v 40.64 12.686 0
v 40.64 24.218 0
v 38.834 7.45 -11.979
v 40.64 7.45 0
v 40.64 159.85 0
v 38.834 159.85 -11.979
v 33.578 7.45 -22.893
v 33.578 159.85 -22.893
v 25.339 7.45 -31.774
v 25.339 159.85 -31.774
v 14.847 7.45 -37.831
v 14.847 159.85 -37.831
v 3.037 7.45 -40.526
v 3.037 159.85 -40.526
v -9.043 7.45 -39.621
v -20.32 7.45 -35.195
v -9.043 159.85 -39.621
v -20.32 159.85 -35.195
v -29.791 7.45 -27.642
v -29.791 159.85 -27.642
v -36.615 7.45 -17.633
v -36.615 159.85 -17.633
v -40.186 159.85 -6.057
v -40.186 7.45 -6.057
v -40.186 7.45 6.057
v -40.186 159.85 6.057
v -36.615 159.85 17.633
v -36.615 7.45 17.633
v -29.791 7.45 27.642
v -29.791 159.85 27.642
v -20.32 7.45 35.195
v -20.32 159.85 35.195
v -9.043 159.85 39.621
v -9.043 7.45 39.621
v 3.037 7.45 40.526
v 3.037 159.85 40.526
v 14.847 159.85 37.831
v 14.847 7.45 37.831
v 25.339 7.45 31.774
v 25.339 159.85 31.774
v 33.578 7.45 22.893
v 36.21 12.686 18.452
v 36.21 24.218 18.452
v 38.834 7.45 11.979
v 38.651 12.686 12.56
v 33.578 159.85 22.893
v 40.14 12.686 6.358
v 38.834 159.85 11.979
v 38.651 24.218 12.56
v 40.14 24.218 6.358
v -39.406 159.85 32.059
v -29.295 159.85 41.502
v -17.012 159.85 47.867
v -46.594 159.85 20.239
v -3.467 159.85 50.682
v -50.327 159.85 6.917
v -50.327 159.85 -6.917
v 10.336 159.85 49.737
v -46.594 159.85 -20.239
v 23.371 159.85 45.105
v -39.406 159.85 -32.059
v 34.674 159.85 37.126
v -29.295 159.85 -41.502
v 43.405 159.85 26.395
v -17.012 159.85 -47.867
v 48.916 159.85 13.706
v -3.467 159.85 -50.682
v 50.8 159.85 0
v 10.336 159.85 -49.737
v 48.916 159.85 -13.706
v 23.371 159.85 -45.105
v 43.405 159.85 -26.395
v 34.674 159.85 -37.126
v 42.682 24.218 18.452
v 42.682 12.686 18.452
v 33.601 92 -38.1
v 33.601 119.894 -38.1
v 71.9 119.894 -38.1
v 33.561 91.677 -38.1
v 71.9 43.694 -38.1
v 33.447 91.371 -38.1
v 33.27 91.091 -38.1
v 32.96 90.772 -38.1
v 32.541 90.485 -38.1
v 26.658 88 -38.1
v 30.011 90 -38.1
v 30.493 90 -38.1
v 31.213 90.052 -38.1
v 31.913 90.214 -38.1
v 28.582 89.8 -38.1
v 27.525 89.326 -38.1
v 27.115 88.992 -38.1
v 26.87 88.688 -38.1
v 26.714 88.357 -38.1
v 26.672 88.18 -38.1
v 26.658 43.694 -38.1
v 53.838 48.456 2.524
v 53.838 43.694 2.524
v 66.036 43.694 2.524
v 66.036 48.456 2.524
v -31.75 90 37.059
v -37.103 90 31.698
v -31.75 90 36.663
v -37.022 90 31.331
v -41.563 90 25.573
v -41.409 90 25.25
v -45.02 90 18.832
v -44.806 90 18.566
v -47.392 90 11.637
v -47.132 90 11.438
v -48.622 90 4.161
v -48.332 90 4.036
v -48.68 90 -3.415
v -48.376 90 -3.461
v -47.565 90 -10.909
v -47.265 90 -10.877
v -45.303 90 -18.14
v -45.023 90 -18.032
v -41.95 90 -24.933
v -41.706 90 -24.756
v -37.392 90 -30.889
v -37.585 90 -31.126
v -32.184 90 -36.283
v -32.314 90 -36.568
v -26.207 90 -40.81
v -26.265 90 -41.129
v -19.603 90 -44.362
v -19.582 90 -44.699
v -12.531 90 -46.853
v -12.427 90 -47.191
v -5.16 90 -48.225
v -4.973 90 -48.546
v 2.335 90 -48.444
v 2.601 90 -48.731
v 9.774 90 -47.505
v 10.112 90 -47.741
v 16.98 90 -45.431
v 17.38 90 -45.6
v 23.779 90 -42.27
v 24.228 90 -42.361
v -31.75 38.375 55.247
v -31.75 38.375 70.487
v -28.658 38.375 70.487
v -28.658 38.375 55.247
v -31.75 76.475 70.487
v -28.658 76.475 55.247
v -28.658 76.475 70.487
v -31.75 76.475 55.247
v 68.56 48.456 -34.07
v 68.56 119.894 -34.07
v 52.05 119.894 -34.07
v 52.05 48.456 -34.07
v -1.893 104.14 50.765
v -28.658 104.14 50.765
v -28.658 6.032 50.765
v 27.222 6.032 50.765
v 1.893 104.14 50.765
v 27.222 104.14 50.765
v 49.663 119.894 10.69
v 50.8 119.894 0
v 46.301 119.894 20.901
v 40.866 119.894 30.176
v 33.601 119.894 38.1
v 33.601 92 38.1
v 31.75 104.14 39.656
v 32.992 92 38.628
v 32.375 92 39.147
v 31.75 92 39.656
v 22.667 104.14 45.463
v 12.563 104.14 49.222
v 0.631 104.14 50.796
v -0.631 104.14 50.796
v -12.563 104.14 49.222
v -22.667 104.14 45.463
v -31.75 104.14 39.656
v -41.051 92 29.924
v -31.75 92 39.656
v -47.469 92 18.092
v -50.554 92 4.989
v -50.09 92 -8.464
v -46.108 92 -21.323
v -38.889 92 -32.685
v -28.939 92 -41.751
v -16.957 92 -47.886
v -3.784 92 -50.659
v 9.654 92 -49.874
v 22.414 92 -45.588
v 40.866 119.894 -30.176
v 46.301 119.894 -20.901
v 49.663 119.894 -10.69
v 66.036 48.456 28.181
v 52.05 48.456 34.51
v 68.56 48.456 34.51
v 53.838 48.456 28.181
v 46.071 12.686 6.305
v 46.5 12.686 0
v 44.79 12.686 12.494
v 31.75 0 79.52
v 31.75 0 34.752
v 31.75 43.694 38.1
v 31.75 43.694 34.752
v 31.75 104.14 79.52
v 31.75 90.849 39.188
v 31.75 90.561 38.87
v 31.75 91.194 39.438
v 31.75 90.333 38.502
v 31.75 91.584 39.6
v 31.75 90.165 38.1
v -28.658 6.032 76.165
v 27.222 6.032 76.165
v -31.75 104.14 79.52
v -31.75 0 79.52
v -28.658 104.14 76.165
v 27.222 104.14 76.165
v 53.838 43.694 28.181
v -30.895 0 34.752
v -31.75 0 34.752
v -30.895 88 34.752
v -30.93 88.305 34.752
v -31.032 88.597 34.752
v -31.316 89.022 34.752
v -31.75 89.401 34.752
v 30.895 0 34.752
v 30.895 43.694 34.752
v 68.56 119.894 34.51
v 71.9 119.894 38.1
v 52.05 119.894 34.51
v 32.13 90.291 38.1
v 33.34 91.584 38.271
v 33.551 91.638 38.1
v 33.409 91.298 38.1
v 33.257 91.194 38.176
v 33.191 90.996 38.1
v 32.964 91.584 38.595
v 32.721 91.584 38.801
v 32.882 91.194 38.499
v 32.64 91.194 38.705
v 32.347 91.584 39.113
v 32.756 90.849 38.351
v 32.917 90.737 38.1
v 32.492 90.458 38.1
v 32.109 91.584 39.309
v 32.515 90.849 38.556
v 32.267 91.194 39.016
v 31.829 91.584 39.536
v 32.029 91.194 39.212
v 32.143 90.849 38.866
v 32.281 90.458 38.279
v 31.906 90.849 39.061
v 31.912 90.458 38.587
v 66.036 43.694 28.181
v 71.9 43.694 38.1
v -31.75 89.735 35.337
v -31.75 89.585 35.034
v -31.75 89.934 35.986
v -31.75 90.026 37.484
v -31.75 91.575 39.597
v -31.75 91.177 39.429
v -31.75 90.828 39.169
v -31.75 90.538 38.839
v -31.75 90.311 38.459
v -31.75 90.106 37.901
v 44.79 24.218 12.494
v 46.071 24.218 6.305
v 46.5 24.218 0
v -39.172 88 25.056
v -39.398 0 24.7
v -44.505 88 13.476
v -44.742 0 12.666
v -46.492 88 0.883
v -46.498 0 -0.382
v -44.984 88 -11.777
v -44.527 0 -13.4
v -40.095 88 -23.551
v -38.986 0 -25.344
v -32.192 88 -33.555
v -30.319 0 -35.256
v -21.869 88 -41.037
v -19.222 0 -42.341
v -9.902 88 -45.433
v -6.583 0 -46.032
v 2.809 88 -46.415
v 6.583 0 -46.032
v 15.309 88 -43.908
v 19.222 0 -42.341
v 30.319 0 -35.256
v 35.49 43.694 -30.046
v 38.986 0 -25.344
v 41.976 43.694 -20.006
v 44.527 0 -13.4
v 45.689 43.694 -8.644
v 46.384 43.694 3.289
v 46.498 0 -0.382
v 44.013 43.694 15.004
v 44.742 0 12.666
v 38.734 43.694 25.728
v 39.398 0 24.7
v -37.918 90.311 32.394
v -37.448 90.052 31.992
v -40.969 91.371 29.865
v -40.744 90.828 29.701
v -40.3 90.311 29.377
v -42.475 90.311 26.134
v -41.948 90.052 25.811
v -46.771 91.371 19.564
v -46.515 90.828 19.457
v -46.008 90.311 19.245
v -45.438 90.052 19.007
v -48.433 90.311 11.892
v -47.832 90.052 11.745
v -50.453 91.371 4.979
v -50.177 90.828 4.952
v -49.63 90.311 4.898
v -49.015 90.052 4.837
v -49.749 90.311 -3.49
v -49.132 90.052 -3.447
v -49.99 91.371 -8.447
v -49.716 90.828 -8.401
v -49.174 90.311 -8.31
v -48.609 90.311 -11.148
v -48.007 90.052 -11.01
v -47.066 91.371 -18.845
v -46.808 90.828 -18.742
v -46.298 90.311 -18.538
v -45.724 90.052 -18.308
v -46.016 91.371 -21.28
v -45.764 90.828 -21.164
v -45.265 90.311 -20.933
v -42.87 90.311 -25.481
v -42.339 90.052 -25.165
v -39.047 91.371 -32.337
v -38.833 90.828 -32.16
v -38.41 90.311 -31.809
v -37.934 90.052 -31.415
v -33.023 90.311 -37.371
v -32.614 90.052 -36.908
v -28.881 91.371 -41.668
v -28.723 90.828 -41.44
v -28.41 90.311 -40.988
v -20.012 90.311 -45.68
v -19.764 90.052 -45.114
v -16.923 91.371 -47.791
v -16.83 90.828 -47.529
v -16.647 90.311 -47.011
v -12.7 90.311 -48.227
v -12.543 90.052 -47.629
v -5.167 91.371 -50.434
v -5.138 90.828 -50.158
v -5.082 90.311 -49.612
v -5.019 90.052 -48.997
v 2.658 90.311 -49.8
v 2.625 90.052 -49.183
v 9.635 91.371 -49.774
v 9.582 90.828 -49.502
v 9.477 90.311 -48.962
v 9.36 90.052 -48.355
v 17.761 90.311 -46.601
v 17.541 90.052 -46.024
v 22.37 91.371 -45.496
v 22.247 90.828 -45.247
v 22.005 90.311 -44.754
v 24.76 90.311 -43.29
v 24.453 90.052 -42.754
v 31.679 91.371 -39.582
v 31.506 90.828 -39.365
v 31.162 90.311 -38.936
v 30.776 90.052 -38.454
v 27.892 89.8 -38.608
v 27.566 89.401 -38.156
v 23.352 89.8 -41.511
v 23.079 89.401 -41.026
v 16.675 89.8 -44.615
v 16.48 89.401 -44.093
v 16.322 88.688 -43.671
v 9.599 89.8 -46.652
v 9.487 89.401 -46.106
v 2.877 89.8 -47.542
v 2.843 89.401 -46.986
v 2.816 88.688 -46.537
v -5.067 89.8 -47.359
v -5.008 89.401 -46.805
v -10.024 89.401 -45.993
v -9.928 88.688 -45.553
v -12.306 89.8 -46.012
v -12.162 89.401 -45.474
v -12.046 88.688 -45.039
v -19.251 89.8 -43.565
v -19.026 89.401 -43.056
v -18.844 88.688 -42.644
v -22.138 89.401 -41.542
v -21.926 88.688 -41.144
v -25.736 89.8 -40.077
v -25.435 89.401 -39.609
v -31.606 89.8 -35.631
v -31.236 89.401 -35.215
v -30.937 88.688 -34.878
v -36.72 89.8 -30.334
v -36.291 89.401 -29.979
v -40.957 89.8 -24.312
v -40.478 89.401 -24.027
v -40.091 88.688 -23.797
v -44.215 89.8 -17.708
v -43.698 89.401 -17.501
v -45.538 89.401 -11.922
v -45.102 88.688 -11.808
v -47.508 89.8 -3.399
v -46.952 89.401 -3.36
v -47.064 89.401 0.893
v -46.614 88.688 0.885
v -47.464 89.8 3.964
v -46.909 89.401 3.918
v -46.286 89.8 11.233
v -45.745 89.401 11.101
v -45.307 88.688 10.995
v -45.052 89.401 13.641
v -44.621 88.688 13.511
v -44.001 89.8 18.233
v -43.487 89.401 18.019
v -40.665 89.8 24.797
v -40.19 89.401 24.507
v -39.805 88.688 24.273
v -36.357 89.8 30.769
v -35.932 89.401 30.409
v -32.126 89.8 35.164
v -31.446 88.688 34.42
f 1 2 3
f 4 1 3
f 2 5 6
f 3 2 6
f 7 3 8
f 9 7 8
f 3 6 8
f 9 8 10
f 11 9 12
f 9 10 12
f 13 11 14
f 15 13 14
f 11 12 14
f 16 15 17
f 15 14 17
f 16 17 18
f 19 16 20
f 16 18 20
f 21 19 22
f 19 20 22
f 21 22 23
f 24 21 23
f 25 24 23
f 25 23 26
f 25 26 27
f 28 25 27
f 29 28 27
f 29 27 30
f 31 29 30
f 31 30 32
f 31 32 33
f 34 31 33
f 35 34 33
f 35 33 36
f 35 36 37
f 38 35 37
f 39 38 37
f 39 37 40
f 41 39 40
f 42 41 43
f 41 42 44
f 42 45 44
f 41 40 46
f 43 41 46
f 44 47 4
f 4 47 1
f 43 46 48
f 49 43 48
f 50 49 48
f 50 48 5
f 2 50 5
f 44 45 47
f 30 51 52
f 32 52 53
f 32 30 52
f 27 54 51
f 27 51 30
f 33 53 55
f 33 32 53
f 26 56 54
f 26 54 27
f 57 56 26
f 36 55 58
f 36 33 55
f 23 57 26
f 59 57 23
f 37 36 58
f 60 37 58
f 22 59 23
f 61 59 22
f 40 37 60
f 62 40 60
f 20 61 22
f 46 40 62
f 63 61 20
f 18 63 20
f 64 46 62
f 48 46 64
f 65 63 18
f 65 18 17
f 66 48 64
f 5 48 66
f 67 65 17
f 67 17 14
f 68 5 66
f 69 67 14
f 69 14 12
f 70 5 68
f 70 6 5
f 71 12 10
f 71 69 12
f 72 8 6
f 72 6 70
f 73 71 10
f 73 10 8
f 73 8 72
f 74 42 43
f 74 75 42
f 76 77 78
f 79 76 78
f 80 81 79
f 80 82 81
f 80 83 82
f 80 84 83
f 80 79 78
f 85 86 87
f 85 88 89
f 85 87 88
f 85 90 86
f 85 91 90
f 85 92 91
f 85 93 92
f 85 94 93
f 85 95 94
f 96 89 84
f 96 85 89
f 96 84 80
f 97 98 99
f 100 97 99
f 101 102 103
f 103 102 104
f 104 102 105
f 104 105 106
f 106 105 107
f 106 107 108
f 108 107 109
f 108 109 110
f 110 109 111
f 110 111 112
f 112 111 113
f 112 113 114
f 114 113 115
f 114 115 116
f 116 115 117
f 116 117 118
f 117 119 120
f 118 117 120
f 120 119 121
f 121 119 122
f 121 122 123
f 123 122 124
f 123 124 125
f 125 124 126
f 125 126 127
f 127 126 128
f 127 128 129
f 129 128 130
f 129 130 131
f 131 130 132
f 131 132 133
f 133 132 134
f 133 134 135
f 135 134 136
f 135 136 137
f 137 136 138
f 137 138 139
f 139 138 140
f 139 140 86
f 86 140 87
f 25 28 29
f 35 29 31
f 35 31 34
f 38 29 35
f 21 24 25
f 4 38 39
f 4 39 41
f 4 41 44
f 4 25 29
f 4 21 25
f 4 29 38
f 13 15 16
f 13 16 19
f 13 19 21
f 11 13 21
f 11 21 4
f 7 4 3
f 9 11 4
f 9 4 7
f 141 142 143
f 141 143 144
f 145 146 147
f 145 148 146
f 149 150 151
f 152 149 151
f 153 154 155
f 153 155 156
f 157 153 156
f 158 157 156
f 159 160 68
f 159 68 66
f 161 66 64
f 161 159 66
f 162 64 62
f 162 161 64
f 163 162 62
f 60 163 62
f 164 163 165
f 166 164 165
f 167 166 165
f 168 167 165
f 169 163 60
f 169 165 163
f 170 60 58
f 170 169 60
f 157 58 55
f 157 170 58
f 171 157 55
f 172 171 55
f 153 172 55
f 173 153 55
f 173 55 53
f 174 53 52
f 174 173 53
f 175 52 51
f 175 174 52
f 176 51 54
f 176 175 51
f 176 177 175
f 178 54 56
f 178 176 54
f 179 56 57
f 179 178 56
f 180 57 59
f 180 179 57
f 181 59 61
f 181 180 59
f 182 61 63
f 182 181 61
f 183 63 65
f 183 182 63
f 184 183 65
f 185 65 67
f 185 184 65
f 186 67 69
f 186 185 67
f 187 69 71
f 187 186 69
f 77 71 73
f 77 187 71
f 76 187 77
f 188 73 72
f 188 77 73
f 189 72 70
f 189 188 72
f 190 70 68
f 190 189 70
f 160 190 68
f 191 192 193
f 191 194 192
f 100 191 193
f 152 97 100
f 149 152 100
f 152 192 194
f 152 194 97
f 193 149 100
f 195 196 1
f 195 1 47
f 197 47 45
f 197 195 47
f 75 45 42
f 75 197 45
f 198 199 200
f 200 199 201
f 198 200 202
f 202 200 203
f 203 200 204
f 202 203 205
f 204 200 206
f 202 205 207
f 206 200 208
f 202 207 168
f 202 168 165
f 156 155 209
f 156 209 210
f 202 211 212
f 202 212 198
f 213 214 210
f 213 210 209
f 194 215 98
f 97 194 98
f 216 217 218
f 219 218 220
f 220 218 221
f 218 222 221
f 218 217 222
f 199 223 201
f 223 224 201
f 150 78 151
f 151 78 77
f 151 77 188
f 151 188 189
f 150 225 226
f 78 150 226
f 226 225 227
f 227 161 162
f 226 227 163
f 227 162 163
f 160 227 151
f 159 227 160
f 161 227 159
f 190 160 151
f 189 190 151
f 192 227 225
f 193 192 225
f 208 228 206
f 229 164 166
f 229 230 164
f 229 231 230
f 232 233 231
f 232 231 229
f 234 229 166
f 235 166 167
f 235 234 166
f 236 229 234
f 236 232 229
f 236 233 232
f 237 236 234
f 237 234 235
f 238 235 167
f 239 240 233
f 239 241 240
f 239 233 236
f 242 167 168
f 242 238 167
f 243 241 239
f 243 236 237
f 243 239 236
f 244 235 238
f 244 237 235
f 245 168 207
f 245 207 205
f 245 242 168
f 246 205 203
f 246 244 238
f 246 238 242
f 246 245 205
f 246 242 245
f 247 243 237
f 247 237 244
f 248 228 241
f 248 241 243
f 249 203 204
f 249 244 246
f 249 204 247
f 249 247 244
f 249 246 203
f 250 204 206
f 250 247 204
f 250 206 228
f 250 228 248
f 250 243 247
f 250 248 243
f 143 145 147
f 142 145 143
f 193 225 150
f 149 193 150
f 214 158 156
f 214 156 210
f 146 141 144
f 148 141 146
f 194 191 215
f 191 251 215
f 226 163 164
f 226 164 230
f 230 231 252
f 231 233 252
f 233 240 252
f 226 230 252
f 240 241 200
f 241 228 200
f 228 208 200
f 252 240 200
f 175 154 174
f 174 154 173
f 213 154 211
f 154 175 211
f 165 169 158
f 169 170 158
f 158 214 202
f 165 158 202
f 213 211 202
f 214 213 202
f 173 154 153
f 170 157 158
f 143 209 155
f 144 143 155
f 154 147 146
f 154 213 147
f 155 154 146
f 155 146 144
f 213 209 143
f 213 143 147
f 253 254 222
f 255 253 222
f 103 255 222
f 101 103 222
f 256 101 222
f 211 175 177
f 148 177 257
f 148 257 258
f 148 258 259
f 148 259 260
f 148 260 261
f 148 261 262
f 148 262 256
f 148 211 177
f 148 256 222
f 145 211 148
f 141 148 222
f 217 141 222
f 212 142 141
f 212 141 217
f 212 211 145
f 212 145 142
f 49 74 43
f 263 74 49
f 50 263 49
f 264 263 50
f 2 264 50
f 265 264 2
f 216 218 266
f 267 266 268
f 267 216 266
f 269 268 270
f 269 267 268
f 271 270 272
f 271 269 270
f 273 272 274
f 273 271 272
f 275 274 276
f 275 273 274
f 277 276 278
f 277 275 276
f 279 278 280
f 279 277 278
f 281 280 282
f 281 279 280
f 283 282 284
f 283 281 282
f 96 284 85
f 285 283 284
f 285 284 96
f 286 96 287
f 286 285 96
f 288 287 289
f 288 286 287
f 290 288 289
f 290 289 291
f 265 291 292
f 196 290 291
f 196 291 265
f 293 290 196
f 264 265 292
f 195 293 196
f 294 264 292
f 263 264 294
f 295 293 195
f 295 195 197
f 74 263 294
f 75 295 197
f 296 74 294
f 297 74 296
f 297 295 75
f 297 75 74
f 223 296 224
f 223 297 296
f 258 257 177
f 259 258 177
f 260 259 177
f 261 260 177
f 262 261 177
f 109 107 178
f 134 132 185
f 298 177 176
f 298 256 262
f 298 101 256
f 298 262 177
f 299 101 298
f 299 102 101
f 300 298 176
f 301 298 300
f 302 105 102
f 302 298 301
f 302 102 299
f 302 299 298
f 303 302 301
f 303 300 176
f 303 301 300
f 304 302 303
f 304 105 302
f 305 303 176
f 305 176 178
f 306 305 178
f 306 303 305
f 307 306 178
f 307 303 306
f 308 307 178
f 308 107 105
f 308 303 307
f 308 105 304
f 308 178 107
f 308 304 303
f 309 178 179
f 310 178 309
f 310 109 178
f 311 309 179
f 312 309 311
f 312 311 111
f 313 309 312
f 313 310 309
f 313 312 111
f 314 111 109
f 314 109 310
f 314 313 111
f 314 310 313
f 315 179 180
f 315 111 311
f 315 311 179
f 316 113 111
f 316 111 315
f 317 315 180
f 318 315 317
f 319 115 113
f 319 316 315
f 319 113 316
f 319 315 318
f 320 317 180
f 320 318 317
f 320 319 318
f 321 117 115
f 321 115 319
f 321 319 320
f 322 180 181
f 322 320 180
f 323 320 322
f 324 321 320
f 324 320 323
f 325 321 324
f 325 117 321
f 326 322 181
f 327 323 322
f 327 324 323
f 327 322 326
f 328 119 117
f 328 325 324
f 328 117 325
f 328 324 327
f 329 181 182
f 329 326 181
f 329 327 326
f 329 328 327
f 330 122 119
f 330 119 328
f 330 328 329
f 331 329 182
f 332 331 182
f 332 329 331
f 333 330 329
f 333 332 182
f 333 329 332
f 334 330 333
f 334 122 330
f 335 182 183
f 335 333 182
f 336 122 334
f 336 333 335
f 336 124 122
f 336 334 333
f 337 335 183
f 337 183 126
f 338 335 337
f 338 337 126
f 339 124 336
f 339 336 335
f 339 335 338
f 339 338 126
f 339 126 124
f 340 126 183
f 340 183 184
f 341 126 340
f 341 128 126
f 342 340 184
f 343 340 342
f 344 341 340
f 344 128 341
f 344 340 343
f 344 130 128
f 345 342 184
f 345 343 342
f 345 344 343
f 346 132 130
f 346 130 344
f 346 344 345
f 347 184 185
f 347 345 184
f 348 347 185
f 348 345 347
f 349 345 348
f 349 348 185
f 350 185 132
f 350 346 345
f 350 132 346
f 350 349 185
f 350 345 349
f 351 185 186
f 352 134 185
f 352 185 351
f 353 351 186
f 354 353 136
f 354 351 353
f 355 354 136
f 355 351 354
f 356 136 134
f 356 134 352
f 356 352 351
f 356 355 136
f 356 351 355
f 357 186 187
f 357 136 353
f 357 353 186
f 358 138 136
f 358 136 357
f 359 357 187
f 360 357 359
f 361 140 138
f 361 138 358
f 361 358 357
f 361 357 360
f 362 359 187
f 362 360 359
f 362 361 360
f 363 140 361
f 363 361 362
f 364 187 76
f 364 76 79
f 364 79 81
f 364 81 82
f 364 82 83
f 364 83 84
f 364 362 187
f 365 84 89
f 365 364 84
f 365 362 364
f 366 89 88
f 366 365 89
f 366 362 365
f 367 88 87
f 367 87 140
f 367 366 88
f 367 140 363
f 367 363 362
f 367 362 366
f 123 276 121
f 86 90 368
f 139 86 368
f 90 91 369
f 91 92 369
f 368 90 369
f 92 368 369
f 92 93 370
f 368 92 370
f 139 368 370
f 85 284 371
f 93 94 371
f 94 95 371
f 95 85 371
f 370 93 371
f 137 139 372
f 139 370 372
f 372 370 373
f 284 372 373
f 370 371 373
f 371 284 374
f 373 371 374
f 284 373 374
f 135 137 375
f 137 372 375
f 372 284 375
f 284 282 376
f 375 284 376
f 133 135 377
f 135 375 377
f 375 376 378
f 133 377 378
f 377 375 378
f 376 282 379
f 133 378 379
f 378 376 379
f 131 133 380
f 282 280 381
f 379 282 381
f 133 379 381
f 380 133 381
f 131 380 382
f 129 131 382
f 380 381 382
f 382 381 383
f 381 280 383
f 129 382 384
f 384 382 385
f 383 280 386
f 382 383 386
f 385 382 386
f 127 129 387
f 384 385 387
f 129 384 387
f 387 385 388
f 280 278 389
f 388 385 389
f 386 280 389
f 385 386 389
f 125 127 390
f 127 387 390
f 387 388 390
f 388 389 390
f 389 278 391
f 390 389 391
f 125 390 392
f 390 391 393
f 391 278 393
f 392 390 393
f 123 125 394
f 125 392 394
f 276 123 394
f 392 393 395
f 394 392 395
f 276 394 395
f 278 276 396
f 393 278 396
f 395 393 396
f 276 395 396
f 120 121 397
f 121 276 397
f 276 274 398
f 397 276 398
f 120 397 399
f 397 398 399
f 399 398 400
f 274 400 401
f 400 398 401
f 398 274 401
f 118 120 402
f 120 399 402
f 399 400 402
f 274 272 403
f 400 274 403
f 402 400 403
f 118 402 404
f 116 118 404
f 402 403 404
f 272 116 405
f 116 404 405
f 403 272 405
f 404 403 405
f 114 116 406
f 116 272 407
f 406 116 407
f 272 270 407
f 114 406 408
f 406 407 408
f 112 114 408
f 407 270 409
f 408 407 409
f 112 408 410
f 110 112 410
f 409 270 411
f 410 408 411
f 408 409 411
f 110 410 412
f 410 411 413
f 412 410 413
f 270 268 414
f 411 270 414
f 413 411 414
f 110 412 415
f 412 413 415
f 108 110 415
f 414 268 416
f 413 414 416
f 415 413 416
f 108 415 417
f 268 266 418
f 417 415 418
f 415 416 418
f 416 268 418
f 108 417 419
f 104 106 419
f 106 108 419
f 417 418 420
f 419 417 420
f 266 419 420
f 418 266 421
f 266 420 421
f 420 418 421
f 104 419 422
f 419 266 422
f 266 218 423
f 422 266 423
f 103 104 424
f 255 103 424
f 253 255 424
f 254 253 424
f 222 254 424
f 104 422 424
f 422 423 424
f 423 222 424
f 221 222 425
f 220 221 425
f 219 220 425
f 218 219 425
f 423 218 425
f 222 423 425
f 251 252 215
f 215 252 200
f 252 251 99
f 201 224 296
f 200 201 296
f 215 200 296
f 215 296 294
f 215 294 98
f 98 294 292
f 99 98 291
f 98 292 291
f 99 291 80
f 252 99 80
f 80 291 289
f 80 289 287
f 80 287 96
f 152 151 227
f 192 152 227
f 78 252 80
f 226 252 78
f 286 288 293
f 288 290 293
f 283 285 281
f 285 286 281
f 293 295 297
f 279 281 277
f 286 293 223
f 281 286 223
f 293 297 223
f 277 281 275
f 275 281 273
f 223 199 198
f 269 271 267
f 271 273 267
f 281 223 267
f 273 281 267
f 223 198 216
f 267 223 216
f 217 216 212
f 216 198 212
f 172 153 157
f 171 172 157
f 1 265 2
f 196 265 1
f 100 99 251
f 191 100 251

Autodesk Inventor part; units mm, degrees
sketch "Sketch1" plane through (0, 0, 0) normal (0, 1, 0) x (-1, 0, 0)
  circle A0 centre (0, 0) radius 46.5
  dimension "d0" = 93
extrude "Extrusion1" add sketch "Sketch1" along normal blind 90
sketch "Sketch2" plane through (0, 90, 0) normal (0, 1, 0) x (1, 0, 0)
  circle A0 centre (0, 0) radius 50.8
  dimension "d3" = 101.6
extrude "Extrusion2" add sketch "Sketch2" along normal blind 146.05
sketch "Sketch4" plane through (0, 90, 0) normal (0, -1, 0) x (1, 0, 0)
  point P0 (0, 0)
sketch "Sketch5" plane through (0, 90, 0) normal (0, -1, 0) x (1, 0, 0)
  point P0 (0, 0)
sketch "Sketch6" plane through (0, 90, 0) normal (0, -1, 0) x (1, 0, 0)
  point P0 (0, 0)
fillet "Fillet1" radius 2 2 edges at (-50.8, 90, 0) (46.5, 90, 0)
ref_plane "Work Plane2" through (46.5, 0, 0) normal (1, 0, 0) x (0, 1, 0)
sketch "Sketch7" plane through (46.5, 0, 0) normal (1, 0, 0) x (0, 1, 0)
  line L0 (24.2179, 0) -> (12.6856, 0)
  line L1 (12.6856, 0) -> (12.6856, 18.4517)
  line L2 (12.6856, 18.4517) -> (24.2179, 18.4517)
  line L3 (24.2179, 18.4517) -> (24.2179, 0)
  point P0 (0, 0)
extrude "Extrusion4" cut sketch "Sketch7" against normal blind 17.4625
sketch "Sketch12" plane through (0, 90, 0) normal (0, -1, 0) x (1, 0, 0)
  point P0 (0, 0)
sketch "Sketch13" plane through (0, 90, 0) normal (0, -1, 0) x (1, 0, 0)
  point P0 (0, 0)
sketch "Sketch14" plane through (0, 90, 0) normal (0, -1, 0) x (1, 0, 0)
  line L0 (65.7696, 29.9336) -> (57.3376, 29.9336)
  line L1 (57.3376, 29.9336) -> (57.3376, 7.1672)
  line L2 (57.3376, 7.1672) -> (65.7696, 7.1672)
  line L3 (65.7696, 7.1672) -> (65.7696, 29.9336)
  point P0 (0, 0)
extrude "Extrusion8" cut sketch "Sketch14" against normal blind 141.605
ref_plane "Work Plane4" through (0, 0, 46.5) normal (0, 0, 1) x (1, 0, 0)
sketch "Sketch24" plane through (0, 0, 46.5) normal (0, 0, 1) x (1, 0, 0)
  point P0 (0, 0)
sketch "Sketch25" plane through (0, 0, 46.5) normal (0, 0, 1) x (1, 0, 0)
  line L0 (0, 0) -> (-31.75, 0)
  line L1 (-31.75, 0) -> (-31.75, 104.14)
  line L2 (-31.75, 104.14) -> (0, 104.14)
  line L3 (0, 104.14) -> (0, 0)
  line L4 (0, 0) -> (31.75, 0)
  line L5 (31.75, 0) -> (31.75, 104.14)
  line L6 (31.75, 104.14) -> (0, 104.14)
  line L7 (0, 104.14) -> (0, 0)
  dimension "d59" = 31.75
  dimension "d60" = 104.14
  dimension "d61" = 31.75
  dimension "d62" = 104.14
extrude "Extrusion13" add sketch "Sketch25" along normal blind 33.02
sketch "Sketch26" plane through (0, 0, 79.52) normal (0, 0, 1) x (1, 0, 0)
  line L0 (-31.75, 104.14) -> (-31.75, 0) projected
  line L1 (0, 0) -> (31.75, 0) projected
  line L2 (-31.75, 104.14) -> (31.75, 104.14)
  line L3 (31.75, 104.14) -> (31.75, 0)
  line L4 (31.75, 0) -> (-31.75, 0)
  line L5 (-31.75, 0) -> (-31.75, 104.14)
extrude "Extrusion14" add sketch "Sketch26" against normal blind 44.7675
sketch "Sketch27" plane through (0, 104.14, 0) normal (0, 1, 0) x (1, 0, 0)
  point P0 (0, 0)
sketch "Sketch28" plane through (0, 104.14, 0) normal (0, 1, 0) x (1, 0, 0)
  point P0 (0, 0)
sketch "Sketch29" plane through (0, 104.14, 0) normal (0, 1, 0) x (1, 0, 0)
  line L0 (-28.6575, -50.7647) -> (27.2225, -50.7647)
  line L1 (27.2225, -50.7647) -> (27.2225, -76.1647)
  line L2 (27.2225, -76.1647) -> (-28.6575, -76.1647)
  line L3 (-28.6575, -76.1647) -> (-28.6575, -50.7647)
  point P0 (0, 0)
  dimension "d67" = 55.88
  dimension "d68" = 25.4
extrude "Extrusion15" cut sketch "Sketch29" against normal blind 98.1075
sketch "Sketch30" plane through (-31.75, 0, 79.52) normal (-1, 0, 0) x (0, 0, 1)
  line L0 (-0.5043, 102.352) -> (0, 76.957)
  line L1 (0, 0) -> (0, 104.14) projected
  line L2 (-24.2726, 76.475) -> (-9.0326, 76.475)
  line L3 (-9.0326, 76.475) -> (-9.0326, 38.375)
  line L4 (-9.0326, 38.375) -> (-24.2726, 38.375)
  line L5 (-24.2726, 38.375) -> (-24.2726, 76.475)
  point P0 (-79.52, 0)
  dimension "d71" = 25.4
  dimension "d72" = 15.24
  dimension "d73" = 38.1
extrude "Extrusion16" cut sketch "Sketch30" against normal blind 46.355
ref_plane "Work Plane5" through (46.5, 0, 0) normal (1, 0, 0) x (0, 1, 0)
sketch "Sketch31" plane through (46.5, 0, 0) normal (1, 0, 0) x (0, 1, 0)
  line L0 (11.9436, 0) -> (43.6936, 0)
  line L1 (43.6936, 0) -> (119.8936, 0)
  line L2 (119.8936, 0) -> (119.8936, 38.1)
  line L3 (119.8936, 38.1) -> (43.6936, 38.1)
  line L4 (43.6936, 38.1) -> (43.6936, 0)
  line L5 (43.6936, 0) -> (119.8936, 0)
  line L6 (119.8936, 0) -> (119.8936, -38.1)
  line L7 (119.8936, -38.1) -> (43.6936, -38.1)
  line L8 (43.6936, -38.1) -> (43.6936, 0)
  point P0 (0, 0)
  dimension "d76" = 31.75
  dimension "d77" = 76.2
  dimension "d78" = 38.1
  dimension "d79" = 76.2
  dimension "d80" = 38.1
extrude "Extrusion17" add sketch "Sketch31" along normal blind 25.4
sketch "Sketch32" plane through (71.9, 0, 0) normal (1, 0, 0) x (0, 0, -1)
  point P0 (0, 0)
sketch "Sketch33" plane through (71.9, 0, 0) normal (1, 0, 0) x (0, 0, -1)
  line L0 (-20.4546, 119.8936) -> (-38.1, 119.8936) projected
  line L1 (0, 43.6936) -> (38.1, 43.6936) projected
  line L2 (-38.1, 119.8936) -> (38.1, 119.8936)
  line L3 (38.1, 119.8936) -> (38.1, 43.6936)
  line L4 (38.1, 43.6936) -> (-38.1, 43.6936)
  line L5 (-38.1, 43.6936) -> (-38.1, 119.8936)
  point P0 (0, 0)
extrude "Extrusion18" add sketch "Sketch33" against normal blind 47.625
sketch "Sketch3" plane through (0, 236.05, 0) normal (0, 1, 0) x (1, 0, 0)
  circle A0 centre (0, 0) radius 40.64
  dimension "d6" = 81.28
extrude "Extrusion3" cut sketch "Sketch3" against normal blind 228.6
sketch "Sketch34" plane through (33.601, 119.8936, 38.1) normal (0, 1, 0) x (1, 0, 0)
  line L0 (34.9589, 72.1697) -> (18.4489, 72.1697)
  line L1 (18.4489, 72.1697) -> (18.4489, 3.5897)
  line L2 (18.4489, 3.5897) -> (34.9589, 3.5897)
  line L3 (34.9589, 3.5897) -> (34.9589, 72.1697)
  point P0 (-33.601, 38.1)
  dimension "d85" = 16.51
  dimension "d86" = 68.58
extrude "Extrusion19" cut sketch "Sketch34" against normal blind 71.4375
sketch "Sketch35" plane through (26.6578, 43.6936, -38.1) normal (0, -1, 0) x (1, 0, 0)
  point P0 (-26.6578, 38.1)
sketch "Sketch36" plane through (26.6578, 43.6936, -38.1) normal (0, -1, 0) x (1, 0, 0)
  line L0 (39.3784, 66.2811) -> (27.1807, 66.2811)
  line L1 (27.1807, 66.2811) -> (27.1807, 40.6237)
  line L2 (27.1807, 40.6237) -> (39.3784, 40.6237)
  line L3 (39.3784, 40.6237) -> (39.3784, 66.2811)
  point P0 (-26.6578, 38.1)
extrude "Extrusion20" cut sketch "Sketch36" against normal blind 71.4375
sketch "Sketch37" plane through (0, 236.05, 0) normal (0, 1, 0) x (1, 0, 0)
  circle A0 centre (0, 0) radius 58.234
extrude "Extrusion21" cut sketch "Sketch37" against normal blind 76.2
properties part number "_3DPrint"
